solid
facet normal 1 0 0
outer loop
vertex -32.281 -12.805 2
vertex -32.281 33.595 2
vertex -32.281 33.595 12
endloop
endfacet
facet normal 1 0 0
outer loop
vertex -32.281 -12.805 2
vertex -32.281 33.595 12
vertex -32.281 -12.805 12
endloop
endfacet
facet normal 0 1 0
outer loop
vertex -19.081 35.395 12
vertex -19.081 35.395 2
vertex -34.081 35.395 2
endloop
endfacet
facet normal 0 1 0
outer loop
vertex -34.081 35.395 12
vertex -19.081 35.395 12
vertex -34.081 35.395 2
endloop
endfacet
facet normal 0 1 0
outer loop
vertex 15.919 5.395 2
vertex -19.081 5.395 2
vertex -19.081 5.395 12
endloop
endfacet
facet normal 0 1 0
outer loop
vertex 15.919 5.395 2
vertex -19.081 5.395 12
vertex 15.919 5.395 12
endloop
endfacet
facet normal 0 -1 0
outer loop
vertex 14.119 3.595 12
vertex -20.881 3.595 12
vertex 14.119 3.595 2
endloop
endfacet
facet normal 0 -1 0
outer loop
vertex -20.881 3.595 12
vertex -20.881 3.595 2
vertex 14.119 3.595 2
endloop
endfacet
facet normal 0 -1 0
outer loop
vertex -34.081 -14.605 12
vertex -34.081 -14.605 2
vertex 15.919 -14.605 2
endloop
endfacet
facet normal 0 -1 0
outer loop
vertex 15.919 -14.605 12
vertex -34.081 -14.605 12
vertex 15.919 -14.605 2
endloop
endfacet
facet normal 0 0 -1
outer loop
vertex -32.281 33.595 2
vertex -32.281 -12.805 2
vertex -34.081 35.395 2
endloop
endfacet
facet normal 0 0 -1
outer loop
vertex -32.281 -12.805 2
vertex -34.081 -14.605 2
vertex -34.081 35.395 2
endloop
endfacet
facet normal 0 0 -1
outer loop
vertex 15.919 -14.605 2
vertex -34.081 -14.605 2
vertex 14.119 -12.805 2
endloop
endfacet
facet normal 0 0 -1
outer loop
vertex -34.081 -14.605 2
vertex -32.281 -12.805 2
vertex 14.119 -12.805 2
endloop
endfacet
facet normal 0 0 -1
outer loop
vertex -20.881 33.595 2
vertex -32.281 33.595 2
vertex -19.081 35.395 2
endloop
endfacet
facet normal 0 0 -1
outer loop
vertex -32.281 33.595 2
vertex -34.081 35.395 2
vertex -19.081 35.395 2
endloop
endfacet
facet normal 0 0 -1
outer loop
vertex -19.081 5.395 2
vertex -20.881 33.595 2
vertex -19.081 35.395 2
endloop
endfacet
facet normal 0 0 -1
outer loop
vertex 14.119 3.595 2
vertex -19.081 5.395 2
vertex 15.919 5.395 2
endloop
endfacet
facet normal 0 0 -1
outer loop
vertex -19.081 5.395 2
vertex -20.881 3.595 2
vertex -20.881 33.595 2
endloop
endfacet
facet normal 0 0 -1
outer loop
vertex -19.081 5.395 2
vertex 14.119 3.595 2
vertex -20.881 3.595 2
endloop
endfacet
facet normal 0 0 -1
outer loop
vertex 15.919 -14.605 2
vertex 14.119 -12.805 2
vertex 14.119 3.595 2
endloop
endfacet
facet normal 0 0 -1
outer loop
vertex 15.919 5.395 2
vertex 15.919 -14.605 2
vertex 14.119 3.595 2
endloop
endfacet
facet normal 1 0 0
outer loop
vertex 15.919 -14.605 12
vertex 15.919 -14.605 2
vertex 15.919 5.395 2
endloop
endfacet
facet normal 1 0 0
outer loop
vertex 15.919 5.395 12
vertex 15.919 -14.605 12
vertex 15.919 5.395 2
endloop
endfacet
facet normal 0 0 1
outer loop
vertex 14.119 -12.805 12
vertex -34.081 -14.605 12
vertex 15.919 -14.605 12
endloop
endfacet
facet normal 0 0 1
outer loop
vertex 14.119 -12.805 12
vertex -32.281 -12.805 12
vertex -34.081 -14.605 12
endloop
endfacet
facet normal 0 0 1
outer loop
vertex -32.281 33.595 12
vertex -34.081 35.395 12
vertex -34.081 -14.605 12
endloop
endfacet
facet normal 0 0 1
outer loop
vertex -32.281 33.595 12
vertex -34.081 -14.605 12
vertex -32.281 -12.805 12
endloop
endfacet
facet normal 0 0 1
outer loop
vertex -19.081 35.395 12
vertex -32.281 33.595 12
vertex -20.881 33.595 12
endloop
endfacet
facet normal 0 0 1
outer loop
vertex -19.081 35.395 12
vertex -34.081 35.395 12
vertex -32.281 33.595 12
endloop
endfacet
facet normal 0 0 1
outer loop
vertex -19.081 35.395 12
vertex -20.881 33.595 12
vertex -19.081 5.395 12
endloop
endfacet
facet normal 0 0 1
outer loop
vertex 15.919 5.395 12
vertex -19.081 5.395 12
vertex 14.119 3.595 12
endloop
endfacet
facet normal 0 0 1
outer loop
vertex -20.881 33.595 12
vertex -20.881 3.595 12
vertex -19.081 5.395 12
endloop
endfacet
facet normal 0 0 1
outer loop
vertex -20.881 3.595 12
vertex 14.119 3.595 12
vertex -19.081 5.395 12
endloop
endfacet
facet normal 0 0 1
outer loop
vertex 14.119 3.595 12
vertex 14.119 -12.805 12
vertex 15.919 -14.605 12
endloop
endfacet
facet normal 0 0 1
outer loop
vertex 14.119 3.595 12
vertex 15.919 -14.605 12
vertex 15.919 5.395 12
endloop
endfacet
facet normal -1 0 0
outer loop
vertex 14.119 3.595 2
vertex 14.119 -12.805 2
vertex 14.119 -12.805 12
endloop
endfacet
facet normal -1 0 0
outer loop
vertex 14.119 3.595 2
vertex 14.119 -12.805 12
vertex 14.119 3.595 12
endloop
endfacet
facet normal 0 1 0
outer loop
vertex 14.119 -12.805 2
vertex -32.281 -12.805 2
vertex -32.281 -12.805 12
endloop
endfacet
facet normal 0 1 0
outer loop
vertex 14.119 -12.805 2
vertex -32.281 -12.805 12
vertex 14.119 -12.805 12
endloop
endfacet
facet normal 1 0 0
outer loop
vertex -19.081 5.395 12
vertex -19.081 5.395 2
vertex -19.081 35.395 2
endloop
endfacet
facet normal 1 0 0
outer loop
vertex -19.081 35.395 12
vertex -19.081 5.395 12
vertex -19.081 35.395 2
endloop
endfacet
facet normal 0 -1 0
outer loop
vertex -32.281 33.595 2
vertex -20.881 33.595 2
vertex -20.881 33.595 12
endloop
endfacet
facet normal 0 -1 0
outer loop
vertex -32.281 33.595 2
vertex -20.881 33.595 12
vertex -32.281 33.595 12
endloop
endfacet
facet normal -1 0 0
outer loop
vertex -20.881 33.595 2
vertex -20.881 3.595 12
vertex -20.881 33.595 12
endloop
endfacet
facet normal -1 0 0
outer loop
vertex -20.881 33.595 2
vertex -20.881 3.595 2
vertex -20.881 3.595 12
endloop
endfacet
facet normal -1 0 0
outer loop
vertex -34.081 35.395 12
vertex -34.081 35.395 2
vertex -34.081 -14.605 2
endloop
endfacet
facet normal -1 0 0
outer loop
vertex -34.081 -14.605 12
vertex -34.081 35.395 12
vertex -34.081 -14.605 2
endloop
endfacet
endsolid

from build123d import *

# Parameters (mm, degrees)
F0_W     = 35
F0_H     = 20
F1_DEPTH = 12
F2_T     = -1.8
F3_DEPTH = 2


with BuildPart() as f1:
    # F0 (on Top) → F1 (new body)
    with BuildSketch(Plane.XY):
        Polygon((-19.0813283622, 35.3948845826), (-34.0813283622, 35.3948845826), (-34.0813283622, -14.6051154174), (-19.0813283622, -14.6051154174), (-19.0813283622, 5.3948845826), align=None)
        with Locations((-1.5813283622, -4.6051154174)):
            Rectangle(F0_W, F0_H)
    extrude(amount=F1_DEPTH)

    # F2
    f2_openings = [f1.faces().sort_by_distance(p)[0] for p in [
        (-14.512363, 3.153505, 12),
    ]]
    offset(amount=F2_T, openings=f2_openings, kind=Kind.INTERSECTION)

    # F0 (on Top) → F3 (cut)
    with BuildSketch(Plane.XY):
        Polygon((-19.0813283622, 35.3948845826), (-34.0813283622, 35.3948845826), (-34.0813283622, -14.6051154174), (-19.0813283622, -14.6051154174), (-19.0813283622, 5.3948845826), align=None)
        with Locations((-1.5813283622, -4.6051154174)):
            Rectangle(F0_W, F0_H)
    extrude(amount=F3_DEPTH, mode=Mode.SUBTRACT)


solid = f1.part
